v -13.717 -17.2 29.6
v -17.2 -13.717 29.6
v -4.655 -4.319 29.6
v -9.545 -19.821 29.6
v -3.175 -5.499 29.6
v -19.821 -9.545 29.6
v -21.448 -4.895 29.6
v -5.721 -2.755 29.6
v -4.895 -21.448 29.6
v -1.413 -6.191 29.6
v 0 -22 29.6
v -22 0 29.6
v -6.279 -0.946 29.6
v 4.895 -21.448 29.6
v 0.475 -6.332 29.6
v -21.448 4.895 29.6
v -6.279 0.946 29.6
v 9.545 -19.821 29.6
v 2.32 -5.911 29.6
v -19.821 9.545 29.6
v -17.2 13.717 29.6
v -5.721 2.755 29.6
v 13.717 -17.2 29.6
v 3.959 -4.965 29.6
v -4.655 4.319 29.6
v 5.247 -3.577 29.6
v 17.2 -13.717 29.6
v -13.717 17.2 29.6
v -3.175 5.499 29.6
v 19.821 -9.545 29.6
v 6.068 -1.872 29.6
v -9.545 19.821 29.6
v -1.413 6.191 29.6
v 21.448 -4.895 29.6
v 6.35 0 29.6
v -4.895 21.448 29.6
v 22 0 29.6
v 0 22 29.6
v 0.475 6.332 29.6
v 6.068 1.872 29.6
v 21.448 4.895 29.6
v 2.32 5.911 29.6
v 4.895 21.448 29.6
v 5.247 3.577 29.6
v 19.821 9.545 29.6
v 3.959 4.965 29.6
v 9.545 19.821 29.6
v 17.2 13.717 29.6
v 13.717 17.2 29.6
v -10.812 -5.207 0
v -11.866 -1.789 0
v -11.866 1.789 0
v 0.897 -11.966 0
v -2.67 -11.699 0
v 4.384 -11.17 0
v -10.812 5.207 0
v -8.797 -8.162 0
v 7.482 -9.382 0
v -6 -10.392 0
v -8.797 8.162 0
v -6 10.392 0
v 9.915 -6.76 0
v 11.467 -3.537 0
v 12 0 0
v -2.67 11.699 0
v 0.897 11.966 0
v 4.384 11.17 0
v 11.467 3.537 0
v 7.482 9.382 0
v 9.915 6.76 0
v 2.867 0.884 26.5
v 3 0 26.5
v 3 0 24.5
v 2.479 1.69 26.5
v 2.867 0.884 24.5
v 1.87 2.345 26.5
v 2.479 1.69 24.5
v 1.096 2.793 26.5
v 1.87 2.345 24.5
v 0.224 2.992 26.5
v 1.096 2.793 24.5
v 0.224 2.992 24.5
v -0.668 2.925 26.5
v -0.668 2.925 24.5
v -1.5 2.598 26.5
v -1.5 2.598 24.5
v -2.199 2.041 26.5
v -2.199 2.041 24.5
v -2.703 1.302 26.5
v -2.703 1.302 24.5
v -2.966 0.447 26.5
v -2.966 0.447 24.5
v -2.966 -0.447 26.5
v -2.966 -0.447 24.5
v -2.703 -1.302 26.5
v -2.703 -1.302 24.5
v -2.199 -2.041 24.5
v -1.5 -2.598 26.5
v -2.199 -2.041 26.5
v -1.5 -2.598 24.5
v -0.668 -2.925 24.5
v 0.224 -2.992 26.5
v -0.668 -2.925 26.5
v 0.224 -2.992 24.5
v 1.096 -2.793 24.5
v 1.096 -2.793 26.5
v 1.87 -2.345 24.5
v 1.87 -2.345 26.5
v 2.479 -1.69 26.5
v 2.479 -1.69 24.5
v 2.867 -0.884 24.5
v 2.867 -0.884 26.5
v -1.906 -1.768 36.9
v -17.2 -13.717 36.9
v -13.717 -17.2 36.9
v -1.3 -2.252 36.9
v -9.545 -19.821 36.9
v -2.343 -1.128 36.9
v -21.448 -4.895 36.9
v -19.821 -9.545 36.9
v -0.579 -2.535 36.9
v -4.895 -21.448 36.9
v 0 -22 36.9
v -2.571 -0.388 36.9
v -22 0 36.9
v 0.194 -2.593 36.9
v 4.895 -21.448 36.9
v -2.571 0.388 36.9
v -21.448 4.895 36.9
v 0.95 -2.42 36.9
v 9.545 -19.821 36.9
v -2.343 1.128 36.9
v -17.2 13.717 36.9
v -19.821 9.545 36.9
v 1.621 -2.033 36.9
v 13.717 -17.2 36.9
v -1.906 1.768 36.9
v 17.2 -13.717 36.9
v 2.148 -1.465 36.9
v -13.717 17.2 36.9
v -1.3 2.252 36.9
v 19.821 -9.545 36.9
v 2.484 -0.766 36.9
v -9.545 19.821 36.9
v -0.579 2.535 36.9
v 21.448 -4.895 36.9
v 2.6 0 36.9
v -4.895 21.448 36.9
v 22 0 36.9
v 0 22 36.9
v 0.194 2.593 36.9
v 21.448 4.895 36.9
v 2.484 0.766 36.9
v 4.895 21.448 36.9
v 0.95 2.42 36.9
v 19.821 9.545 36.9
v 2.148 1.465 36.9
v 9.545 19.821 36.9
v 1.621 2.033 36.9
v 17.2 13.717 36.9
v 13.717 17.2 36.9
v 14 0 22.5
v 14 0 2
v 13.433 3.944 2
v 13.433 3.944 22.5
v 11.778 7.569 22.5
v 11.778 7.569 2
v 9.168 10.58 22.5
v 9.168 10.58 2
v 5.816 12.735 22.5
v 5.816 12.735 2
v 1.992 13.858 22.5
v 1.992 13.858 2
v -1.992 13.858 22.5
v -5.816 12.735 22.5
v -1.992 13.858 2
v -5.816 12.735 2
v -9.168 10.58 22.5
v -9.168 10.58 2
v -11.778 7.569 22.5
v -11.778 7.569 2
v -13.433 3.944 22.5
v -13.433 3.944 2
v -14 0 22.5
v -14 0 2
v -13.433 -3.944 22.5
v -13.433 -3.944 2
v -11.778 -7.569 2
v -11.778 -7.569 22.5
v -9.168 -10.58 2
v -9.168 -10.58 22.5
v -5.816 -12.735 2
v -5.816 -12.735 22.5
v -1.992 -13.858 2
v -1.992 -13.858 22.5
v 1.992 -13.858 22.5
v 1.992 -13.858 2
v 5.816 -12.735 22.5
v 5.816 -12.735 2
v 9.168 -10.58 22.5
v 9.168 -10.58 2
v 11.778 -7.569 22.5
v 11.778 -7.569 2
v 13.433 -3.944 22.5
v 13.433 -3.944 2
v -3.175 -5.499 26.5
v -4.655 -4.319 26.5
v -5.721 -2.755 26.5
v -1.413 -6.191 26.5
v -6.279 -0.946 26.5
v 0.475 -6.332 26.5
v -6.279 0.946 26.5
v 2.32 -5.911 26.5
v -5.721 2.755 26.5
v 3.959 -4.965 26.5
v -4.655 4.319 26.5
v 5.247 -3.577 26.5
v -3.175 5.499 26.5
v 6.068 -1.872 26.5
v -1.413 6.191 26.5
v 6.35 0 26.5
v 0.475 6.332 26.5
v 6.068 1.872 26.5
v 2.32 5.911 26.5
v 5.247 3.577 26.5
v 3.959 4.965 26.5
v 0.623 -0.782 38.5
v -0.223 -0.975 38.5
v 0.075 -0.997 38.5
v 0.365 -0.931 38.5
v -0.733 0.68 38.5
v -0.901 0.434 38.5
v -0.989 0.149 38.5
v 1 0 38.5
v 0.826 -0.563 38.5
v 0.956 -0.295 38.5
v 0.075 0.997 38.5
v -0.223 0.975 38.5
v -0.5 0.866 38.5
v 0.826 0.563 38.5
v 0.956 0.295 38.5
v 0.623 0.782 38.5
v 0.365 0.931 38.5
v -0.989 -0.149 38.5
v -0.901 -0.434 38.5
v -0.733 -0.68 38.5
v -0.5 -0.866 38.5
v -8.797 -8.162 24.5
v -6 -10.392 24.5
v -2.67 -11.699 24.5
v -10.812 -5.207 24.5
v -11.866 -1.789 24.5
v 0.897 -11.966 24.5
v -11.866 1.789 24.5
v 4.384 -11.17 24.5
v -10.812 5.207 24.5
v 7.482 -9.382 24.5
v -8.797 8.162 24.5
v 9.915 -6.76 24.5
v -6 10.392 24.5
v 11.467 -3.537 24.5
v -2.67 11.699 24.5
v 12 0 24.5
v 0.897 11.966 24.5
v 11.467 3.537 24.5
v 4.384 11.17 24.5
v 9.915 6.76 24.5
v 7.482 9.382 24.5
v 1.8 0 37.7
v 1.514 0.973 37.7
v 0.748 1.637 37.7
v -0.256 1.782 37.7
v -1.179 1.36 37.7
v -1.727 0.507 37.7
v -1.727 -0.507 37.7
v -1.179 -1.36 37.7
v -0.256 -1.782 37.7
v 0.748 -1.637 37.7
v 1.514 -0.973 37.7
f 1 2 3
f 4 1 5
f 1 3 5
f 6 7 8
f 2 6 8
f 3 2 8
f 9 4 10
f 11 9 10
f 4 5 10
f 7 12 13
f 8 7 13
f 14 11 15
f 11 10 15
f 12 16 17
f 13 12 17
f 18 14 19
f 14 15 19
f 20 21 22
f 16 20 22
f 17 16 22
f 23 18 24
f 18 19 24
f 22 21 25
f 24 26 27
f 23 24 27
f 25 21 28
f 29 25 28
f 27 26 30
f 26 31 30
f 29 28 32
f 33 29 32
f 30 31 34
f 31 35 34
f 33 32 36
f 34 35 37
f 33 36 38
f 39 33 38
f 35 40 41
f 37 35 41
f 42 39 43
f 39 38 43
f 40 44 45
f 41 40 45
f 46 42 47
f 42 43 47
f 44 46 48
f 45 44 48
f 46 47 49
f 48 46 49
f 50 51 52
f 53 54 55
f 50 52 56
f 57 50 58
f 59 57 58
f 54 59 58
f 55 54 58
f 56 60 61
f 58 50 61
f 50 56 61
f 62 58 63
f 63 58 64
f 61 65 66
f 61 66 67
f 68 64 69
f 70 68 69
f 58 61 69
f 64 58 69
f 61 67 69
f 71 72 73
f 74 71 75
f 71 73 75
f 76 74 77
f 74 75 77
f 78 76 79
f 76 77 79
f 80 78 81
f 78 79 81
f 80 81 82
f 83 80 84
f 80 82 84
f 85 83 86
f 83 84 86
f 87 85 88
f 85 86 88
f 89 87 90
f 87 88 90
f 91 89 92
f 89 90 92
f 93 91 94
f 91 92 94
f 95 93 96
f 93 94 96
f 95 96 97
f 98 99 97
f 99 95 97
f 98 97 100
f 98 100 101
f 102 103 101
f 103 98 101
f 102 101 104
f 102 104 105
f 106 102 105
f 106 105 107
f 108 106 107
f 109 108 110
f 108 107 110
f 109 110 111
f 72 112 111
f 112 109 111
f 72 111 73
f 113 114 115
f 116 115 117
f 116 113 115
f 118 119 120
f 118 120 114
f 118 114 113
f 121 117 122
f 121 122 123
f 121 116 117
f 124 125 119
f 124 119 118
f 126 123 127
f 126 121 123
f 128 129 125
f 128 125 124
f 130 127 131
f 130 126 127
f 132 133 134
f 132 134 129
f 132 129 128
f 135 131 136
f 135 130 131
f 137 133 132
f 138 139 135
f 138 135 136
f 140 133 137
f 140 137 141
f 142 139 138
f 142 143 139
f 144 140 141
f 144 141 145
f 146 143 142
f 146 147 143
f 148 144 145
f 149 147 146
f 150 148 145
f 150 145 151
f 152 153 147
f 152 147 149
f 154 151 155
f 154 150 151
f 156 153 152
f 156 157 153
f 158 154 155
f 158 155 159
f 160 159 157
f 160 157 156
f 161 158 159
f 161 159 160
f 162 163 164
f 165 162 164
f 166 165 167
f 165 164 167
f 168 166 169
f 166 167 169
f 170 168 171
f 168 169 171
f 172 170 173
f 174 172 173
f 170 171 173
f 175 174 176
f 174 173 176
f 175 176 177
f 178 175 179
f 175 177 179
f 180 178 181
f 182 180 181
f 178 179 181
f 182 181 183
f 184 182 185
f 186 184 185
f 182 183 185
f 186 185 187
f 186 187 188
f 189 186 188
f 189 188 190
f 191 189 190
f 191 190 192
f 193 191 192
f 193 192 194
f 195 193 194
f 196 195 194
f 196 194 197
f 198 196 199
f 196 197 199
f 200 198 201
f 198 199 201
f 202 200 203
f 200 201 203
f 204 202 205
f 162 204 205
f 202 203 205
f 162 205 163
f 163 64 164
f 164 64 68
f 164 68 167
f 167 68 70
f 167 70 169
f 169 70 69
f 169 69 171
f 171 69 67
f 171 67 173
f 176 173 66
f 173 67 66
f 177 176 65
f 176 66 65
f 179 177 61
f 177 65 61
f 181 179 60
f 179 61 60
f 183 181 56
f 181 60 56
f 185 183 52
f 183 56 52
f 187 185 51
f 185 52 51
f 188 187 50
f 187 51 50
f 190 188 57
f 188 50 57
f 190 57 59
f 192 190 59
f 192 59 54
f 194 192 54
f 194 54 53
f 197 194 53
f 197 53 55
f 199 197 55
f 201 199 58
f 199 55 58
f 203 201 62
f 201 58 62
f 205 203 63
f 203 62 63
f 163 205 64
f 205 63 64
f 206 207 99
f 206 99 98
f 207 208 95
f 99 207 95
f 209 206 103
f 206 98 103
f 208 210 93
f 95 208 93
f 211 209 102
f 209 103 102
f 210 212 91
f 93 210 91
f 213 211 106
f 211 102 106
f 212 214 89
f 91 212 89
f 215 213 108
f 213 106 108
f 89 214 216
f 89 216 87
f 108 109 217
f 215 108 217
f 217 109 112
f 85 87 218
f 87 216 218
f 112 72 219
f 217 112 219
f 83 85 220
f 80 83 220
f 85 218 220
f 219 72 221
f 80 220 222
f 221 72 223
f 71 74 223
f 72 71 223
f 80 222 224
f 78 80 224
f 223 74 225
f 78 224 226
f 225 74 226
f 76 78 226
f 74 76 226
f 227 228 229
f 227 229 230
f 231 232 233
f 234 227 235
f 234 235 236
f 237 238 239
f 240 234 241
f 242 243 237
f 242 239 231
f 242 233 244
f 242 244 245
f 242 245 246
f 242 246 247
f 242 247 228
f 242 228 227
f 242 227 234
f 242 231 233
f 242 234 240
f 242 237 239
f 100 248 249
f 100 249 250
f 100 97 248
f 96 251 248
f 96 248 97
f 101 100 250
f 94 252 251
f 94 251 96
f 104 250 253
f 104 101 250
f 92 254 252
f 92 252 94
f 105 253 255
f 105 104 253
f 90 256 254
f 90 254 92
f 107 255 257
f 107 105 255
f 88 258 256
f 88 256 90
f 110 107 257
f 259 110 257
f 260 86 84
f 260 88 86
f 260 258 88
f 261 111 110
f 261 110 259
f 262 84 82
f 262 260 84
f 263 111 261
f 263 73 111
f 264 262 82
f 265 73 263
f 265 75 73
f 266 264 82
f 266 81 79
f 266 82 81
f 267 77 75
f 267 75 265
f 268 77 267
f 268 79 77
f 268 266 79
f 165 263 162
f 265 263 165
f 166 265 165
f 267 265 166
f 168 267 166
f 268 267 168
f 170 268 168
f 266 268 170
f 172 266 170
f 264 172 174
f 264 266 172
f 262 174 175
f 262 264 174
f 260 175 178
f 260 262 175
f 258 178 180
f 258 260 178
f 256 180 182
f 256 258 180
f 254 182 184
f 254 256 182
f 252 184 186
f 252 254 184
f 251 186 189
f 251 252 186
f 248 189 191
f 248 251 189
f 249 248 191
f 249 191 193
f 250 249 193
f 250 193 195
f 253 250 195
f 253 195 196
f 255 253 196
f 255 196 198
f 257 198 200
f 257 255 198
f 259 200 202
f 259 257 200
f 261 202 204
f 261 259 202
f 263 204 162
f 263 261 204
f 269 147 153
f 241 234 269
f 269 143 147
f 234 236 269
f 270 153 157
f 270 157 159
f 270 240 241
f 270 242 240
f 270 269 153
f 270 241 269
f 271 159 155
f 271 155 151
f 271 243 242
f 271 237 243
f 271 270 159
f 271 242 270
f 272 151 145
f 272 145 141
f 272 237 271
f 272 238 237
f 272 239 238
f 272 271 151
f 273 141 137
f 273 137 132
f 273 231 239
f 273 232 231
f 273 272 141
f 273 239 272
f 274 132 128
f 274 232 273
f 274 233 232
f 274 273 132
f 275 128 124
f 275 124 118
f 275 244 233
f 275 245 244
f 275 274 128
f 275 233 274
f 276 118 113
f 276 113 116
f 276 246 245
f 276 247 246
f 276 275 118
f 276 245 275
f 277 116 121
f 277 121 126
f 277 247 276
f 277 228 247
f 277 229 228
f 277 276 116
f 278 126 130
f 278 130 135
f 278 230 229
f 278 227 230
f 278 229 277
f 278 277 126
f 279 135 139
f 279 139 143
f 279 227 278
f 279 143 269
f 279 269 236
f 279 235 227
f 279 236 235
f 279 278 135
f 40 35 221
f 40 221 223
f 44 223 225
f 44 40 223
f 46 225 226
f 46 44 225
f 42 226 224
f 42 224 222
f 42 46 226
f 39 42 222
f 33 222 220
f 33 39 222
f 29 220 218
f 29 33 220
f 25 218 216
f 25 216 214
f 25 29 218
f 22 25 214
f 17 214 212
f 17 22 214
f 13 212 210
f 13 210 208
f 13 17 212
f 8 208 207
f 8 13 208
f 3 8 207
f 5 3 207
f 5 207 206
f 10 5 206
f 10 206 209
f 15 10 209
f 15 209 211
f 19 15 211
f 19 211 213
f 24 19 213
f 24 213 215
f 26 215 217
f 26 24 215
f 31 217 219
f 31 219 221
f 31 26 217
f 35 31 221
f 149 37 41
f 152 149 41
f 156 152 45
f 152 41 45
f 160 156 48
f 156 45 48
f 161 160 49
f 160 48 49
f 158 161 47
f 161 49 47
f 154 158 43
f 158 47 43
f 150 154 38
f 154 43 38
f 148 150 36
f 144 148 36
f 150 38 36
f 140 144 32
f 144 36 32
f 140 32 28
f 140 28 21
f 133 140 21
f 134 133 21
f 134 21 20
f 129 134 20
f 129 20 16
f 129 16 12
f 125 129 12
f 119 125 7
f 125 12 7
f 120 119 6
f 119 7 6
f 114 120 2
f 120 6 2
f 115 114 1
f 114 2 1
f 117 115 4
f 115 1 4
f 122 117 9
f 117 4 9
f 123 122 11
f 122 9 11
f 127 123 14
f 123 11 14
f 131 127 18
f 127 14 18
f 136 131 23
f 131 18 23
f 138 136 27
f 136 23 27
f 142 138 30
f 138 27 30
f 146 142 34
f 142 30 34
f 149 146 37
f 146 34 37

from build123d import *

# Parameters (mm, degrees)
F0_R     = 3
F1_DEPTH = 38.5
F0_R_2   = 14
F2_DEPTH = 24.5
F3_SIZE  = 2
F5_R     = 22
F5_R_2   = 6.35
F6_DEPTH = 7.3
F7_DEPTH = 3.1


with BuildPart() as f1:
    # F0 (on Top) → F1 (new body)
    with BuildSketch(Plane.XY):
        Circle(F0_R)
    extrude(amount=F1_DEPTH)

    # F0 (on Top) → F2 (join)
    with BuildSketch(Plane.XY):
        Circle(F0_R_2)
        Circle(F0_R, mode=Mode.SUBTRACT)
    extrude(amount=F2_DEPTH)

    # F3
    f3_edges = [f1.edges().sort_by_distance(p)[0] for p in [
        (-14, 0, 0),
        (-14, 0, 24.5),
        (-3, 0, 38.5),
    ]]
    chamfer(f3_edges, length=F3_SIZE)

    # F5 (on offset) → F6 (join)
    with BuildSketch(Plane.XY.offset(29.6)):
        Circle(F5_R)
        Circle(F5_R_2, mode=Mode.SUBTRACT)
        Circle(F5_R_2)
    extrude(amount=F6_DEPTH)

    # F5 (on offset) → F7 (join)
    with BuildSketch(Plane.XY.offset(29.6)):
        Circle(F5_R_2)
    extrude(amount=-F7_DEPTH)


solid = f1.part
